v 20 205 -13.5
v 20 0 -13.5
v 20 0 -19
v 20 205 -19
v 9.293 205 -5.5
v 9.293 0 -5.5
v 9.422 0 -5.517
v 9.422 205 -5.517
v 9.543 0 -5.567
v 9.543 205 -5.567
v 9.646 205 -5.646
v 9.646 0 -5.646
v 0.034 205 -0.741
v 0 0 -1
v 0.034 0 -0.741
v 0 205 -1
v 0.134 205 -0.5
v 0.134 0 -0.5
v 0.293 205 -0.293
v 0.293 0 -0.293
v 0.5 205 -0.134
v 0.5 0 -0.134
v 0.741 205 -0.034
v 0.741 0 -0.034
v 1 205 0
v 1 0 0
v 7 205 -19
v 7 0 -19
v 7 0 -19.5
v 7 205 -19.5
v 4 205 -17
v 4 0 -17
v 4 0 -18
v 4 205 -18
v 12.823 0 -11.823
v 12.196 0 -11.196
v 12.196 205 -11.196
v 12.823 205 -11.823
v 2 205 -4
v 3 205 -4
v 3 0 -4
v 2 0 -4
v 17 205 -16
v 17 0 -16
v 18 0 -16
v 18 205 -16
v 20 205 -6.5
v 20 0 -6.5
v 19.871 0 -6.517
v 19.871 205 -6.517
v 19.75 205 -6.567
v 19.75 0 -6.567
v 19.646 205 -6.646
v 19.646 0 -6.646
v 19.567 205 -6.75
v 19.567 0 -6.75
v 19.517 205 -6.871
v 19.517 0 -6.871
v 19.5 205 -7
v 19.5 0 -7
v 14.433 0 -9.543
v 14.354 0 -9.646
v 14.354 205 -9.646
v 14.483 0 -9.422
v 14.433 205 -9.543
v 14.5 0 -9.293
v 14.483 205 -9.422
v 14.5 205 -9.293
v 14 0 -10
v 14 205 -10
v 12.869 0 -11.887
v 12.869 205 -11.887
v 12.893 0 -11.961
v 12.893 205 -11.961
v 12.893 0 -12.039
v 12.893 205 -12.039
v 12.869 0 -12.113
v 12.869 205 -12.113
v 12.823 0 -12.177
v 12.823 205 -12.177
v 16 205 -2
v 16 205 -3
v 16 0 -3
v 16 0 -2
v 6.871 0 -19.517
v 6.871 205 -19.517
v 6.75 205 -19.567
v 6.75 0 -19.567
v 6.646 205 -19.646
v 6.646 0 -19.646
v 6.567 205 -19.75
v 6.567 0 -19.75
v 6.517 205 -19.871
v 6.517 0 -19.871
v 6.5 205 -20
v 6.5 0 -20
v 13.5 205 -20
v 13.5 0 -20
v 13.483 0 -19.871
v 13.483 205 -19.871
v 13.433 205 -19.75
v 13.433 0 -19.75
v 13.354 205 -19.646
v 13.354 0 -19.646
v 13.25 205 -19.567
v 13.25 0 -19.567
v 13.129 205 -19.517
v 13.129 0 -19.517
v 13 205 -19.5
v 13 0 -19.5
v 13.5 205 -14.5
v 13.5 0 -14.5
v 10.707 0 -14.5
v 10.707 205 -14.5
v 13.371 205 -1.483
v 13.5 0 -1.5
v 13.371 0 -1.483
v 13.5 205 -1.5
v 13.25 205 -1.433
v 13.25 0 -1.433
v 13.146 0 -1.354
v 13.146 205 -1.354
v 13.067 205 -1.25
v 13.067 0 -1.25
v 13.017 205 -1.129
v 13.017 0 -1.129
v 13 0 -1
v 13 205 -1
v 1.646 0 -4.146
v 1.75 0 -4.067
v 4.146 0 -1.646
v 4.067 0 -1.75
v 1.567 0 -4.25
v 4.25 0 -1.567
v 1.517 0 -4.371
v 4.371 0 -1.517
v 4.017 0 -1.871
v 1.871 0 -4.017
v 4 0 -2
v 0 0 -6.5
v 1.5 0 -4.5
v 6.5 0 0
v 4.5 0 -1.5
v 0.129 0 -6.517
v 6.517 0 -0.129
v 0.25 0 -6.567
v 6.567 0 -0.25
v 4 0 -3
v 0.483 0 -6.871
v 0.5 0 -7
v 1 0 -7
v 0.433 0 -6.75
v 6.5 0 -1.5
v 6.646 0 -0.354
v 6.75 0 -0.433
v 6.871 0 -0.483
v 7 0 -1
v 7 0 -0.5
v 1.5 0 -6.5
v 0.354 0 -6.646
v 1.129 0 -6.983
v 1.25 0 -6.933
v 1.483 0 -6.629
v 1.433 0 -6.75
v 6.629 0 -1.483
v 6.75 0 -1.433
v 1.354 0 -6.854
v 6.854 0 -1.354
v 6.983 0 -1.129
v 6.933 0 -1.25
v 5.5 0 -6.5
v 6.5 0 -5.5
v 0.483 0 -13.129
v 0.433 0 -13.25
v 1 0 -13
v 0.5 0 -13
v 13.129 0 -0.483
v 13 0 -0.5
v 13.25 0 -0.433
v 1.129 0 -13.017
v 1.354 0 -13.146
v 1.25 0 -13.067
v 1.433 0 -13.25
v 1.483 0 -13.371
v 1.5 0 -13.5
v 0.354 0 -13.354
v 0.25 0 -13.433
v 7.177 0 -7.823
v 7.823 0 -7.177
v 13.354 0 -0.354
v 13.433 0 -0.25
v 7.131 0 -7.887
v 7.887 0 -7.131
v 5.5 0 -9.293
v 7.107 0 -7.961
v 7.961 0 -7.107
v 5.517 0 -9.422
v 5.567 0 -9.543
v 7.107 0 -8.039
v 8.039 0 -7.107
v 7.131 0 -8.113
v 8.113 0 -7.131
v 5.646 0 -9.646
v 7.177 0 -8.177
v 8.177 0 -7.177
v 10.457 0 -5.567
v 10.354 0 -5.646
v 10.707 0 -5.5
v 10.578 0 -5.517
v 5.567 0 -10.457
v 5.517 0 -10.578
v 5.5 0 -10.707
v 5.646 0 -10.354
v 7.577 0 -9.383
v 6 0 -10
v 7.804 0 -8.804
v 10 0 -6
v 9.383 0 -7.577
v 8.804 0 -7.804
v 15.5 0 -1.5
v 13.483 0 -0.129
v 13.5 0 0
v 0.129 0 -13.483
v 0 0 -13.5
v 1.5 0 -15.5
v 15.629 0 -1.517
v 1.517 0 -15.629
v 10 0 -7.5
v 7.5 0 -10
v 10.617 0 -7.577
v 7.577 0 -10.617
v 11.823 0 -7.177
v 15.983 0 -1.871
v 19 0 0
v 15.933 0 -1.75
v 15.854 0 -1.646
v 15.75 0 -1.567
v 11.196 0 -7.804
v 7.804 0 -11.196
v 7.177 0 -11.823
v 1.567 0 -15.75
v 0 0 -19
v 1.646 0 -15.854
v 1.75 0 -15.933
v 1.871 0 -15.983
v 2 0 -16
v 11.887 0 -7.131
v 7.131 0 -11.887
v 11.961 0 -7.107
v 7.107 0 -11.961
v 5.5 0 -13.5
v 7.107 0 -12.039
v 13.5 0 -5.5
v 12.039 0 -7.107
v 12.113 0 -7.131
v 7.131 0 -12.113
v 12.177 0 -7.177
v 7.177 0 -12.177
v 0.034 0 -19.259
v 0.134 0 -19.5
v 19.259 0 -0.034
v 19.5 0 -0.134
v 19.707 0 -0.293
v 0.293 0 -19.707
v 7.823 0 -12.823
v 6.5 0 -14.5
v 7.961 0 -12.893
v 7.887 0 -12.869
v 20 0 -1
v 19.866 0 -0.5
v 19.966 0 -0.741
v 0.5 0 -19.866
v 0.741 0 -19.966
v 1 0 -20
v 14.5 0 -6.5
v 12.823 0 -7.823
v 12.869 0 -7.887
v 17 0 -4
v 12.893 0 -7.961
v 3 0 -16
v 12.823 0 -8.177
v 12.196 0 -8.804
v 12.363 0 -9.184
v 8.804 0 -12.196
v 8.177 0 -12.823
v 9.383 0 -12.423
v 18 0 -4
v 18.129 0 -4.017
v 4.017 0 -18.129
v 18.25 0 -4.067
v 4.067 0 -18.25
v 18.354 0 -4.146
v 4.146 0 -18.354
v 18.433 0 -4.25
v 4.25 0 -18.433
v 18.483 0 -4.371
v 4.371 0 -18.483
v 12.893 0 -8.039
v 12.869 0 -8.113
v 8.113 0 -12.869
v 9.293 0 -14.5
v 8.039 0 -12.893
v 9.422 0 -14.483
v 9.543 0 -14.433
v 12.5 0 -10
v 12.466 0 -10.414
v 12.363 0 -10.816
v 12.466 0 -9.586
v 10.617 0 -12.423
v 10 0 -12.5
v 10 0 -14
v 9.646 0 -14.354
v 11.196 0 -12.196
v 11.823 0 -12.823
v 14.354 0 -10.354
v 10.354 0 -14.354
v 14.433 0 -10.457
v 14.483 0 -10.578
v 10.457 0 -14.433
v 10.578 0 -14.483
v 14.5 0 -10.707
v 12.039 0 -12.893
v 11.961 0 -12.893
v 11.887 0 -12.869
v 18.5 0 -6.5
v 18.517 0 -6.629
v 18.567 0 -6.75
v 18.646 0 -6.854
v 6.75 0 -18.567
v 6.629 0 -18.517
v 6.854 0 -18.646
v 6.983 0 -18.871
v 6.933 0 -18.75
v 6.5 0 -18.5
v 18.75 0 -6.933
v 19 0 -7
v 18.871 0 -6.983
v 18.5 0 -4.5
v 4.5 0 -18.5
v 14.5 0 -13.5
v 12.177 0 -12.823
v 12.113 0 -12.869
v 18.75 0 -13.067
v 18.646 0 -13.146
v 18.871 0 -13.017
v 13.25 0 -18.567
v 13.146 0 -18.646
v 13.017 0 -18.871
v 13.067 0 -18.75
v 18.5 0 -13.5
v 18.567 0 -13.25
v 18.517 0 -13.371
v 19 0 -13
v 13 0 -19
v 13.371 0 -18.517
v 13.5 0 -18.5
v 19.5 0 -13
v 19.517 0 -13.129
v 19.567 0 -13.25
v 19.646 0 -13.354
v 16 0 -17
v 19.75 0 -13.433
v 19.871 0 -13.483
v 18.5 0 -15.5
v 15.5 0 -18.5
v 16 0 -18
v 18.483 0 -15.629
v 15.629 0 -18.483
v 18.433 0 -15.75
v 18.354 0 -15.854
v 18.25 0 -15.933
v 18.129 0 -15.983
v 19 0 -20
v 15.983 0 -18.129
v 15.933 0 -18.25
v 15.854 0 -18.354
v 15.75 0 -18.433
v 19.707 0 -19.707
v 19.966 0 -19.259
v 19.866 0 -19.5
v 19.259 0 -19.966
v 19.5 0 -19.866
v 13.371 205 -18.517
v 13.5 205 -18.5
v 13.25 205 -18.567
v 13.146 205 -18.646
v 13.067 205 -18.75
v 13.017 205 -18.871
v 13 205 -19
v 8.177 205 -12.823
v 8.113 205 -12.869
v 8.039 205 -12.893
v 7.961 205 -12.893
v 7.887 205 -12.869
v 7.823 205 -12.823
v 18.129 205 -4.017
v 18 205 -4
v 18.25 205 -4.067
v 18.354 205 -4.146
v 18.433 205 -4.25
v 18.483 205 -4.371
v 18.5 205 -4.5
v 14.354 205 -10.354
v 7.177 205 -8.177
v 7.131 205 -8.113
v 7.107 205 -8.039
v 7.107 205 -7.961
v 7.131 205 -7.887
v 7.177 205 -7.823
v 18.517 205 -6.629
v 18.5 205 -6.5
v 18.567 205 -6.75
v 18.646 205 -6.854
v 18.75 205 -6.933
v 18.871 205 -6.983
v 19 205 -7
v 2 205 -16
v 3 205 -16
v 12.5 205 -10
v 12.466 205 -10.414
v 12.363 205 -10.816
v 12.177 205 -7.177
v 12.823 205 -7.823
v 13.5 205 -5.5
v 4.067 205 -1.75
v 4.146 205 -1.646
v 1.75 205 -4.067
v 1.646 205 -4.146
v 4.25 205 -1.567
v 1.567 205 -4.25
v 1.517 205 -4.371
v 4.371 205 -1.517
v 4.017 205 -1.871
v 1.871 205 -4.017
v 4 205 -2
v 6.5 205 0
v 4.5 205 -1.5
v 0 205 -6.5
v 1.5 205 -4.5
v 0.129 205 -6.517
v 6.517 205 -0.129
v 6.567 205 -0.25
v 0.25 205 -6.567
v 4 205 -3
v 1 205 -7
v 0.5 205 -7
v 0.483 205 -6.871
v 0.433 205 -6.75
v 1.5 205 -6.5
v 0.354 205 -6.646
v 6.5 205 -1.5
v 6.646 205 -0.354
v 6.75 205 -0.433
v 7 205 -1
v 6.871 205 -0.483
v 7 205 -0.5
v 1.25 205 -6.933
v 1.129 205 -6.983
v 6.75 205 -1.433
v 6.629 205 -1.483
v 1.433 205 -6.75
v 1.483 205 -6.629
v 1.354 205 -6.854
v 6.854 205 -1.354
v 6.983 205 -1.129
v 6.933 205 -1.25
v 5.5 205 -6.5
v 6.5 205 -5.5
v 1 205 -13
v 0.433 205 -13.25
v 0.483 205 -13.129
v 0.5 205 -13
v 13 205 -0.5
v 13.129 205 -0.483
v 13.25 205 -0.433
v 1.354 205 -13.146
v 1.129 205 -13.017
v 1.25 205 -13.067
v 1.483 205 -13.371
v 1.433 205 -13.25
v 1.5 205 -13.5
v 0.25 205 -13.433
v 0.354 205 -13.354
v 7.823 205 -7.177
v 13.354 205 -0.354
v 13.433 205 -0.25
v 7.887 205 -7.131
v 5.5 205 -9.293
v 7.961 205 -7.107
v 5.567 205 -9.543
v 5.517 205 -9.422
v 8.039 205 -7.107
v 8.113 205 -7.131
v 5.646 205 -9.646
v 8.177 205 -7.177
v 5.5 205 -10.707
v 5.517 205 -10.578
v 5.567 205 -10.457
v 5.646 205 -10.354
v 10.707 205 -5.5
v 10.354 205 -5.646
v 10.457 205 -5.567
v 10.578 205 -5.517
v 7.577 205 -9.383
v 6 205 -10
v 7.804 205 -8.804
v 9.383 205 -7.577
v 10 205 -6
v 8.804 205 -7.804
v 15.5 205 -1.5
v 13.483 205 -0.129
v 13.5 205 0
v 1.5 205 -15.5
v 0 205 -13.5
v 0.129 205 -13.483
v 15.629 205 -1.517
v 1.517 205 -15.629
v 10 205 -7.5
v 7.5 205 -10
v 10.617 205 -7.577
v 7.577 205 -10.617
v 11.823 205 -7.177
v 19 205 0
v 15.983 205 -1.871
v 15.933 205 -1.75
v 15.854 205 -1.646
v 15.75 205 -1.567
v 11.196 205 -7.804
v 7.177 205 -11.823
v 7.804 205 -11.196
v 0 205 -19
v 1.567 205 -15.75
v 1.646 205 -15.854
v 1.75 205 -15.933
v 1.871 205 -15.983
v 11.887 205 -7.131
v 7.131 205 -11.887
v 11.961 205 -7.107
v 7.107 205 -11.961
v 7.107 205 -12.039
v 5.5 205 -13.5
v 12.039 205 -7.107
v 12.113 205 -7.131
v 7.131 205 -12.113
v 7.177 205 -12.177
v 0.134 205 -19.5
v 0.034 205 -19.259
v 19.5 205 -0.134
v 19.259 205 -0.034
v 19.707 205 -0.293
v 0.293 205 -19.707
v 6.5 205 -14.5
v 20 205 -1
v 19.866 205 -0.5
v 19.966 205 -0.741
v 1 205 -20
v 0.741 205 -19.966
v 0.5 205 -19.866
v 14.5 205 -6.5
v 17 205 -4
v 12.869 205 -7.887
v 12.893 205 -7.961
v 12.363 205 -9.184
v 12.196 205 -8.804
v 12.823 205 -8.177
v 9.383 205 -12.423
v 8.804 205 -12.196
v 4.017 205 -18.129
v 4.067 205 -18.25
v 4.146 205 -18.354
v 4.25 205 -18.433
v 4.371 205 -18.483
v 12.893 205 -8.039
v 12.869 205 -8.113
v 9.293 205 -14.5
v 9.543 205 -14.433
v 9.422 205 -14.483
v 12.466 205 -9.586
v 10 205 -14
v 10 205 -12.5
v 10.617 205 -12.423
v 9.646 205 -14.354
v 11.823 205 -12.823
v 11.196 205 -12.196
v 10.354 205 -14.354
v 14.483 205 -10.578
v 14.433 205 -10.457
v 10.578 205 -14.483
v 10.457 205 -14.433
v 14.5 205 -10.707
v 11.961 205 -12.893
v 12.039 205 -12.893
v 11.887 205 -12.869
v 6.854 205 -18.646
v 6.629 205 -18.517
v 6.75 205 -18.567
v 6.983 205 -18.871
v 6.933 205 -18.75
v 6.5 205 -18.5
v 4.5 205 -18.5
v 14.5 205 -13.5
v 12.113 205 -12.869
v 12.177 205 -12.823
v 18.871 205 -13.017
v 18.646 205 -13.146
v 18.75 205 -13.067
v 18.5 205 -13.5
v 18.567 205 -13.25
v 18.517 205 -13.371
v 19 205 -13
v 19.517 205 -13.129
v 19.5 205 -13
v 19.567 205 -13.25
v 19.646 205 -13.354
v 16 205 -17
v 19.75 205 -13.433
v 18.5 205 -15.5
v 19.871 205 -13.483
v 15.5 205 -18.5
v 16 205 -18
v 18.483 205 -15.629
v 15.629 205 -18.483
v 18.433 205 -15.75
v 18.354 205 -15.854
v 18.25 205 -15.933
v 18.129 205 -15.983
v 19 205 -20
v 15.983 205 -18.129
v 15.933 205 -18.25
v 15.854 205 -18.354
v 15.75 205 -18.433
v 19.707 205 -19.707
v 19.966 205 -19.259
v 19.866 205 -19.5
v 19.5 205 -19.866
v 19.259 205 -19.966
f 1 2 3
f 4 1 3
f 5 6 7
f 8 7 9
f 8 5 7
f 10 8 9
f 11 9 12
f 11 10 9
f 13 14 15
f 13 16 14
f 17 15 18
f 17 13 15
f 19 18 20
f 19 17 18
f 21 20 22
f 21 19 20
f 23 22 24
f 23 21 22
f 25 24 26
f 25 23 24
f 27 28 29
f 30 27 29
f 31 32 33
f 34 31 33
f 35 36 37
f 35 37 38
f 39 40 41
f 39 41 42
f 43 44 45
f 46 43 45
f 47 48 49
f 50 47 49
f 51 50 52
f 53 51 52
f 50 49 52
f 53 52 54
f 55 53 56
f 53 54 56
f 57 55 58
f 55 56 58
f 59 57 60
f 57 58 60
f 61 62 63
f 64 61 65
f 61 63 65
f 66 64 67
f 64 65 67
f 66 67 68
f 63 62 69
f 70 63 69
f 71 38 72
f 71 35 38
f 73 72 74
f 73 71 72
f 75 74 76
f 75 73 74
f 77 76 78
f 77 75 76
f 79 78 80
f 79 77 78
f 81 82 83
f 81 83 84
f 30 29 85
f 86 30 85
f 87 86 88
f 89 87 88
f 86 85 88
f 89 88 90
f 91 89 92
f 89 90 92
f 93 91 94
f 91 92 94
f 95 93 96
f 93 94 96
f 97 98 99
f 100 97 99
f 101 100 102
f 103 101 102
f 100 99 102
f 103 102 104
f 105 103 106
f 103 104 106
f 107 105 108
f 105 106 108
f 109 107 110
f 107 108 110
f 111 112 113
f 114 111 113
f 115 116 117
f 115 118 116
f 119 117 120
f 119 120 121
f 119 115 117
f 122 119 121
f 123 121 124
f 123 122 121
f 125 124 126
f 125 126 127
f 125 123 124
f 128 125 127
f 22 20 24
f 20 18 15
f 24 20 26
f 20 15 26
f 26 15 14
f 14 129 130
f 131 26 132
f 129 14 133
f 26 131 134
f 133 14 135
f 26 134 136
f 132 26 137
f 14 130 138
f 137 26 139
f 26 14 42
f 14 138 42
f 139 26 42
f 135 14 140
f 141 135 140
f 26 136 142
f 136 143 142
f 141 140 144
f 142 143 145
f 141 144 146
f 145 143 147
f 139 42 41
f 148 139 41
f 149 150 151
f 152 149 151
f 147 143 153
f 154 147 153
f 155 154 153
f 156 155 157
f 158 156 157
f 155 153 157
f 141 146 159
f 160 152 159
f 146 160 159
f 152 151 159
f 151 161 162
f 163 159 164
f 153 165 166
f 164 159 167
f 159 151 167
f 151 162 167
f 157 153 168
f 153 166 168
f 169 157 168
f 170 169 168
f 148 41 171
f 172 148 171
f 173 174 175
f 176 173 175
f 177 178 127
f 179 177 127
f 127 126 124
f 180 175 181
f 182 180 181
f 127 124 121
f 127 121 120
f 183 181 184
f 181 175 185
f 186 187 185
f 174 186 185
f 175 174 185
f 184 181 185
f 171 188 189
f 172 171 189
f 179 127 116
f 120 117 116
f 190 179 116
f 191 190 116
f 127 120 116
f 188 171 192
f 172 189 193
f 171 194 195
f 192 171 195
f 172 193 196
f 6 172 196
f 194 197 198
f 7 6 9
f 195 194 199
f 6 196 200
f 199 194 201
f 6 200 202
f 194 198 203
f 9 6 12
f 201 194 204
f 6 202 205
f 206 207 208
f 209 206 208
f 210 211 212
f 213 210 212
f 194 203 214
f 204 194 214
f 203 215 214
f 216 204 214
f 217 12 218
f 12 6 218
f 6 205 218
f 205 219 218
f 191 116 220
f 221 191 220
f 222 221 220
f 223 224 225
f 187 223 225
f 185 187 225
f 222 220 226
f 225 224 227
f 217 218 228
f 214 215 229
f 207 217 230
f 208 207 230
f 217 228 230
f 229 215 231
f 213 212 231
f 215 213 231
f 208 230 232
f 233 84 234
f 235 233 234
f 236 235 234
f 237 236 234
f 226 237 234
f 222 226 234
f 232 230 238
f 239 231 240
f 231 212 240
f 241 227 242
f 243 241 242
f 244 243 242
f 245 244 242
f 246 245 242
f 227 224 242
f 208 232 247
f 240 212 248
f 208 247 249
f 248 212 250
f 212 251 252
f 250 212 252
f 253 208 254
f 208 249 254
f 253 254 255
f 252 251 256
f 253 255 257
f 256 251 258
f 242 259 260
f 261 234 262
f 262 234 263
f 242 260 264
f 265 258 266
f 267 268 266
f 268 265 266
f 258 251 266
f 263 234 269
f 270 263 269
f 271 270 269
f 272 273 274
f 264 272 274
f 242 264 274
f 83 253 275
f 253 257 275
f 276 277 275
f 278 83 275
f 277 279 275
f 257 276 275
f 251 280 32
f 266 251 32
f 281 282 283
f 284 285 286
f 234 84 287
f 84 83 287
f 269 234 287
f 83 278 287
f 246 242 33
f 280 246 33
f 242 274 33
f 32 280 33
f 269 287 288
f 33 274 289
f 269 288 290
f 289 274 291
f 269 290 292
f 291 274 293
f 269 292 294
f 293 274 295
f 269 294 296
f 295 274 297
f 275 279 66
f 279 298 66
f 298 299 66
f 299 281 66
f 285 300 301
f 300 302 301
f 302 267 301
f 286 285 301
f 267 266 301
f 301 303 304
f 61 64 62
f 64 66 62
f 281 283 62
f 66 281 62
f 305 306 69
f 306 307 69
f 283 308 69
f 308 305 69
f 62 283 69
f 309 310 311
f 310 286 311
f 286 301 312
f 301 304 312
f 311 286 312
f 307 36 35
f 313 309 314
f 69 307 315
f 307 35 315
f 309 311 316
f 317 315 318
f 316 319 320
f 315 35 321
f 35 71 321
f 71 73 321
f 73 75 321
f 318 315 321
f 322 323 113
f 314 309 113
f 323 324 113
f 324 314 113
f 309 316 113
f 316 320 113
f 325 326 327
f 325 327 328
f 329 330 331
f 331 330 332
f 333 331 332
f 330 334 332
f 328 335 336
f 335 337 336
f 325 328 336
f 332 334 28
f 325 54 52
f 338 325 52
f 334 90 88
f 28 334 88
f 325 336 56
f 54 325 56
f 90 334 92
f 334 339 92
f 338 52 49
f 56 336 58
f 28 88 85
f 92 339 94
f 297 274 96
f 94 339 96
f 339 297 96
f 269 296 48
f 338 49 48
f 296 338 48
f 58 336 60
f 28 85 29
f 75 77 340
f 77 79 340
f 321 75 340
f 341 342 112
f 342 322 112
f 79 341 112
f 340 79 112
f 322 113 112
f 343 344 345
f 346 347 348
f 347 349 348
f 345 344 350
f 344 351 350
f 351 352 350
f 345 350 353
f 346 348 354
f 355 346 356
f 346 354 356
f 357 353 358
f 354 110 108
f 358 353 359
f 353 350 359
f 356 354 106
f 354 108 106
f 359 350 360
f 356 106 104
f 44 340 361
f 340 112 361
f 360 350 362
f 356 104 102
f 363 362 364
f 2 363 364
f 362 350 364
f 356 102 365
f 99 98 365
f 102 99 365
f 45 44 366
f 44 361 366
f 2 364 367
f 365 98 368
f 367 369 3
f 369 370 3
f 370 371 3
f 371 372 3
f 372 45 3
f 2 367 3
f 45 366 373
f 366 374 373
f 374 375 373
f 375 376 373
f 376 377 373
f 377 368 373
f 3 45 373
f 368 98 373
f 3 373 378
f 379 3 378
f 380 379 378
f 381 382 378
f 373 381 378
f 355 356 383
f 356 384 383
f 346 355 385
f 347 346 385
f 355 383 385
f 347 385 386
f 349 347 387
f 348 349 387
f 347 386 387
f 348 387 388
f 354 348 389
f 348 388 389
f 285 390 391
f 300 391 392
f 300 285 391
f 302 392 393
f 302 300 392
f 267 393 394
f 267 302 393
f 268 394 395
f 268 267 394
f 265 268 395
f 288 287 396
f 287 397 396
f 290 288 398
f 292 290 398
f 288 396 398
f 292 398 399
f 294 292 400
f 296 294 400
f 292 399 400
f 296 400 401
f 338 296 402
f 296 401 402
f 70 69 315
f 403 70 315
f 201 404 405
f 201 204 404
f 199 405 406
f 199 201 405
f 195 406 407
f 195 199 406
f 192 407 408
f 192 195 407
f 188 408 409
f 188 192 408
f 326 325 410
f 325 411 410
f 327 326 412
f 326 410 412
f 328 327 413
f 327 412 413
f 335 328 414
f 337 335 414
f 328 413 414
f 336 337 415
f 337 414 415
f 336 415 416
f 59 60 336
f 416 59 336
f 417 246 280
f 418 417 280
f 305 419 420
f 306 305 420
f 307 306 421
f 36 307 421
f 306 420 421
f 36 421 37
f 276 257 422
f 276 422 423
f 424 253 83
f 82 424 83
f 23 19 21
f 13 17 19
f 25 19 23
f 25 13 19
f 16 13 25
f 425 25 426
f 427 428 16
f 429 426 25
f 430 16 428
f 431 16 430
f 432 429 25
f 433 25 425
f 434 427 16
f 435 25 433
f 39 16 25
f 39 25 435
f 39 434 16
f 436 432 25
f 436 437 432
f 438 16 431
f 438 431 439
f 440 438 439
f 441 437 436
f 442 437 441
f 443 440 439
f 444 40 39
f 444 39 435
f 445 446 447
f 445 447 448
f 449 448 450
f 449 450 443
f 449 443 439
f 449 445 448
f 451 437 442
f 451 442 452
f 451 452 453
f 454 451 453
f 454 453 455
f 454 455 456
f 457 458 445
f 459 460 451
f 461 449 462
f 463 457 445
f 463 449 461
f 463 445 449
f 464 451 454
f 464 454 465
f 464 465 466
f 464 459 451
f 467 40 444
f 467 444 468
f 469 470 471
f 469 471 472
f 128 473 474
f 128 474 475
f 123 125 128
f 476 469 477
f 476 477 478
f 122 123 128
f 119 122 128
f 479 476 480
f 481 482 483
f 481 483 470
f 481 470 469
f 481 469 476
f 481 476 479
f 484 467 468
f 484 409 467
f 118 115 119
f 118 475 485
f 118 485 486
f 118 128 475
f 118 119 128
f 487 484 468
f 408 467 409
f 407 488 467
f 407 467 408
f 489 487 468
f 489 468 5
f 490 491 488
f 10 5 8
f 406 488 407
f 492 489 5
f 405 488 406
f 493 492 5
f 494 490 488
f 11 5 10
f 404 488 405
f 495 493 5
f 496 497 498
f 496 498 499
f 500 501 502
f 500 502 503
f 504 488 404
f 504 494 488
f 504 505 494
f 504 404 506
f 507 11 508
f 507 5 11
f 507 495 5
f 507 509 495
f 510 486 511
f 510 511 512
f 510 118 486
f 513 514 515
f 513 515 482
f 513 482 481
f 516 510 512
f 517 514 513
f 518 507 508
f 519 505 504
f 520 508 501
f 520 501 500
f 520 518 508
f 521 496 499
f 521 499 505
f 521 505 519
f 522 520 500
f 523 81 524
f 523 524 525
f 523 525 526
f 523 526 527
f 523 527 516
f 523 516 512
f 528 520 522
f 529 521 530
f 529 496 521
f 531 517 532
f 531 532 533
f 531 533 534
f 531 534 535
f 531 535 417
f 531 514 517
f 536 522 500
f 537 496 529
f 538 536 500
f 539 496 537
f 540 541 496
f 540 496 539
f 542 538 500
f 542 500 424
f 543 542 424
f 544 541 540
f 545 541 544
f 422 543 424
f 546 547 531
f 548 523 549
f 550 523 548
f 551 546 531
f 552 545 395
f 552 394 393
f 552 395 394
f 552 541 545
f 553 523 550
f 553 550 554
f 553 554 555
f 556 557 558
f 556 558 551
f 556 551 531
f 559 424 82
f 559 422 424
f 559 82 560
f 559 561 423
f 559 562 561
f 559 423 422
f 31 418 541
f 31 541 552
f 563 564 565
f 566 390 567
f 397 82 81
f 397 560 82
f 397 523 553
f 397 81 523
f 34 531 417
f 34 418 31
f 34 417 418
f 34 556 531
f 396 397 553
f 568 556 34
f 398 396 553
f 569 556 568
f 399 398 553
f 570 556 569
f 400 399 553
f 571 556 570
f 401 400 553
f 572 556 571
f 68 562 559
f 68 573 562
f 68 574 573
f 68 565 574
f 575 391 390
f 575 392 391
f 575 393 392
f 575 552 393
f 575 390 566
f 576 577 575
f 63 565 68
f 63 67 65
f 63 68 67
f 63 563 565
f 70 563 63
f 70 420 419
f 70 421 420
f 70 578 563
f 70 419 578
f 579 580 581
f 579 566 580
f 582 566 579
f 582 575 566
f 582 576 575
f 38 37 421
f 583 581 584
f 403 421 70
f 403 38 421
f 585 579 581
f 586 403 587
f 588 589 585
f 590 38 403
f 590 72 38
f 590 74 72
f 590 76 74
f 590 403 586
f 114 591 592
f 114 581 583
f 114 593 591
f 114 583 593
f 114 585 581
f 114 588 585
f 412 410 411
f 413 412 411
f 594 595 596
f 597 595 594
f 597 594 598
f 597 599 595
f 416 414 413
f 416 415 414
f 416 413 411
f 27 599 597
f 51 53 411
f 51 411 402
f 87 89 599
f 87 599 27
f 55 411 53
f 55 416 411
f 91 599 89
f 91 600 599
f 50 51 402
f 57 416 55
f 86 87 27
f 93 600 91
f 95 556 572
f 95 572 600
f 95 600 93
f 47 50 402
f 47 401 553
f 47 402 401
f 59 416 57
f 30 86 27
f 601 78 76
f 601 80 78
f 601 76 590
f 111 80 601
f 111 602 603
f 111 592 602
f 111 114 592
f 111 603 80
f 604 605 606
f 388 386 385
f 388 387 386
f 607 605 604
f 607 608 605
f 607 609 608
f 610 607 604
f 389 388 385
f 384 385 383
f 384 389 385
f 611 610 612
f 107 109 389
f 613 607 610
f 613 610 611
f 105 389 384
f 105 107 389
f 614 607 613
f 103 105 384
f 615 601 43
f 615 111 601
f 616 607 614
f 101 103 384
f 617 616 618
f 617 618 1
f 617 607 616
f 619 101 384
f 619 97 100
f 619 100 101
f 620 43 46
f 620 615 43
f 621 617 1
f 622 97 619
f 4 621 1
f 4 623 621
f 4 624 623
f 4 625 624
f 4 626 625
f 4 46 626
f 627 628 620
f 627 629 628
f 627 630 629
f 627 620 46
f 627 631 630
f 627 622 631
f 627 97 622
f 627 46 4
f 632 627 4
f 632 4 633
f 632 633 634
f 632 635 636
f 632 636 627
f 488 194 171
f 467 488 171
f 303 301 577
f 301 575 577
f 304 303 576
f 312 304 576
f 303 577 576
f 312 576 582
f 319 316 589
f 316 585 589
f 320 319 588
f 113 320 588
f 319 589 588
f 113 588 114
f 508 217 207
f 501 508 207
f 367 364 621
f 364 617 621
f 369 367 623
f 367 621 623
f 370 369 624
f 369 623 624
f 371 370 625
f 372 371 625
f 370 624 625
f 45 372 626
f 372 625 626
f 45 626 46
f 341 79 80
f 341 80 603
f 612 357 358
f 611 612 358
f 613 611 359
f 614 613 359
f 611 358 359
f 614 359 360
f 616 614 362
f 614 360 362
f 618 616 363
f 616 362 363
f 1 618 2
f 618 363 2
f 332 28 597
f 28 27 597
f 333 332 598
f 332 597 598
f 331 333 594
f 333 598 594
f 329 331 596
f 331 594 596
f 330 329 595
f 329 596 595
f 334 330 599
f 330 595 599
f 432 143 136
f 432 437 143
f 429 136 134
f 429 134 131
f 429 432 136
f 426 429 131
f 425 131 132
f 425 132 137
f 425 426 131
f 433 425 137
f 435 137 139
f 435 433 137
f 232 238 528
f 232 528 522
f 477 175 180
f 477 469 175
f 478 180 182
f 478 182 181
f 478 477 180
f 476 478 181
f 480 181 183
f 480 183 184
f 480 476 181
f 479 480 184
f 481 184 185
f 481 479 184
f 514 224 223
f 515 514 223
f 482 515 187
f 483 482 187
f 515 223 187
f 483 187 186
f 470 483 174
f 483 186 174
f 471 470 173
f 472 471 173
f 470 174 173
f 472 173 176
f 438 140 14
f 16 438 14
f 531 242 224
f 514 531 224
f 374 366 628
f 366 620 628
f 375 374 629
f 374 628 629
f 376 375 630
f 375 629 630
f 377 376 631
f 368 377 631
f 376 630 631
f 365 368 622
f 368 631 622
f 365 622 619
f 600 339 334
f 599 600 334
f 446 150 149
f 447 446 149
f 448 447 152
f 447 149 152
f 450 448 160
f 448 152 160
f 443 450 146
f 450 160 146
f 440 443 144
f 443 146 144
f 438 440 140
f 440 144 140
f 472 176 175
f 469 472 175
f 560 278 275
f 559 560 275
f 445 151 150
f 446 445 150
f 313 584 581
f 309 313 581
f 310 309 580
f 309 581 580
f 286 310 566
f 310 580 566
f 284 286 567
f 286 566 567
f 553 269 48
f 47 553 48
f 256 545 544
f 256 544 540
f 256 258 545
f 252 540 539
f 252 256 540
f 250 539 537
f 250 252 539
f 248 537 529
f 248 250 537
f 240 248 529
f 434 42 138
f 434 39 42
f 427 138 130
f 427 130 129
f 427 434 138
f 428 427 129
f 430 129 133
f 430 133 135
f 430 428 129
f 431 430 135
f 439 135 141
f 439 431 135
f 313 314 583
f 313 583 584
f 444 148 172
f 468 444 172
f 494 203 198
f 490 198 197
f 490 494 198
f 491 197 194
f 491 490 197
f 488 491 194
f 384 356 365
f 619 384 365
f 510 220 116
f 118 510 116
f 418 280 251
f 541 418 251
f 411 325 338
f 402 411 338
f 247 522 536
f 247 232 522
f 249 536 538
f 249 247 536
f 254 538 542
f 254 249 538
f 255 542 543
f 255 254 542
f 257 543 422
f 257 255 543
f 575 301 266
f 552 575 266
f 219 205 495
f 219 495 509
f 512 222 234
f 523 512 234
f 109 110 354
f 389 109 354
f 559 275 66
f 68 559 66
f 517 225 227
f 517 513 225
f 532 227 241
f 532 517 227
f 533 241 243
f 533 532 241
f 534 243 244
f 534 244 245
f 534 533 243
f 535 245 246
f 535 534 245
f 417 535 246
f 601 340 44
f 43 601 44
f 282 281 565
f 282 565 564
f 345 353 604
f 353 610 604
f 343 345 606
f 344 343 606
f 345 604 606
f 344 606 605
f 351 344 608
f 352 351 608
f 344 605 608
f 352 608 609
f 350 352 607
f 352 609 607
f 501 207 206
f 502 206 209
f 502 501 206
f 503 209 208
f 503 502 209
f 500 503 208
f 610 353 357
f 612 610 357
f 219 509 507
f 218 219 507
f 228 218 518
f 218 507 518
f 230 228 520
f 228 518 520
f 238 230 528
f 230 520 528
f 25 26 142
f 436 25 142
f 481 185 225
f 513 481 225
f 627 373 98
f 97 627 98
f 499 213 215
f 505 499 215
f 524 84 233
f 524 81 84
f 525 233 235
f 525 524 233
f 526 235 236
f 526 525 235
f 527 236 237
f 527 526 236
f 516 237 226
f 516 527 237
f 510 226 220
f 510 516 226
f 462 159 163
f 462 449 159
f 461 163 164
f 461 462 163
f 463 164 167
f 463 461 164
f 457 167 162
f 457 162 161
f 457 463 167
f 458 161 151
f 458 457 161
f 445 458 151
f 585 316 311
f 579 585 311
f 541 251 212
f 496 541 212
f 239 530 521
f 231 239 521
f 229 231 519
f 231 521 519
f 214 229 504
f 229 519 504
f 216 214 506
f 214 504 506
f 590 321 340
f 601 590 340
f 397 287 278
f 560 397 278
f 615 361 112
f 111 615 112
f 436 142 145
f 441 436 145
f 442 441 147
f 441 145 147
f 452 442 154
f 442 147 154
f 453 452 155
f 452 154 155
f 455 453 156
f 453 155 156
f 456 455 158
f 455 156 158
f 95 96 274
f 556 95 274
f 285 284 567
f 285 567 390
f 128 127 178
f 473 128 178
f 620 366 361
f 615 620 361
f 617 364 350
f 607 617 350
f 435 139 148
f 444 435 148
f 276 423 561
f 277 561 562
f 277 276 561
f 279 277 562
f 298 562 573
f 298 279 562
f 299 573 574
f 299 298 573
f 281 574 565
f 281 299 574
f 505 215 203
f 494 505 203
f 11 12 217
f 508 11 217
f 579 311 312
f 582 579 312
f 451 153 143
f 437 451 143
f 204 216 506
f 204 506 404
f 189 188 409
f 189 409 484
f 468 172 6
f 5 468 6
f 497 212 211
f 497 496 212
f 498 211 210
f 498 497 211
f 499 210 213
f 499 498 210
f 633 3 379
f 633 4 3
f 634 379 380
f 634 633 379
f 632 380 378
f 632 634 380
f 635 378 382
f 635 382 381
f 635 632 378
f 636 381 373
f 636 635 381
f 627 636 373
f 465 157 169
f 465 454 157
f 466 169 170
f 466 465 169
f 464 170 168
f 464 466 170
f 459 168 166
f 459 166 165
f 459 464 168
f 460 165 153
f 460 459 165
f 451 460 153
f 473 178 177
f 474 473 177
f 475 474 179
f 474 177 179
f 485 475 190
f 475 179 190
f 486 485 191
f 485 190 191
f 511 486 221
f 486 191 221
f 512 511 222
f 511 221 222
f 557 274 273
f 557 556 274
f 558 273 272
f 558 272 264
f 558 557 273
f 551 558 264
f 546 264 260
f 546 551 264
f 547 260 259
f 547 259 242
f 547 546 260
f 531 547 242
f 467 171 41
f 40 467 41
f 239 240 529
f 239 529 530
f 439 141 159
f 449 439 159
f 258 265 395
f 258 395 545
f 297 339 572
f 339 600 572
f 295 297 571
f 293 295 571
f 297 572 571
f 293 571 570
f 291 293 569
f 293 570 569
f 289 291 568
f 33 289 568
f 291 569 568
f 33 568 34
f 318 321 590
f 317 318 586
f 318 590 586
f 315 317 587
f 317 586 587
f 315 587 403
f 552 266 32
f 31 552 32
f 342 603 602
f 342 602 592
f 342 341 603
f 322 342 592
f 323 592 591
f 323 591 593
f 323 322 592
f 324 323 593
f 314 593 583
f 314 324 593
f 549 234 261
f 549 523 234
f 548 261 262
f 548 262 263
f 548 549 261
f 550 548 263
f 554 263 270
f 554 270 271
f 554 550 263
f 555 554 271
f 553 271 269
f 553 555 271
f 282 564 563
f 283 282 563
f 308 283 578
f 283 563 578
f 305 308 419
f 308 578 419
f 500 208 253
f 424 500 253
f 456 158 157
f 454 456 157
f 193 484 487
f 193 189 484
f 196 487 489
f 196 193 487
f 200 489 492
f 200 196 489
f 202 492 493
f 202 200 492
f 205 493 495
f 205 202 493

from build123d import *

# Parameters (mm, degrees)
BOSS_EXTRUDE1_DEPTH = 205
FILLET1_R           = 1
CUT_EXTRUDE1_DEPTH  = 206
FILLET2_R           = 0.5
FILLET3_R           = 0.25


with BuildPart() as part:
    # Sketch3 → Boss-Extrude1 (new body)
    with BuildSketch(Plane(origin=(0, 0, 0), x_dir=(1, 0, 0), z_dir=(0, 1, 0))):
        with BuildLine():
            Line((7, 18.5), (7, 19.5))
            ThreePointArc((7, 19.5), (6.646446609, 19.646446609), (6.5, 20))
            Line((6.5, 20), (0, 20))
            Line((0, 20), (0, 13.5))
            ThreePointArc((0, 13.5), (0.353553391, 13.353553391), (0.5, 13))
            Line((0.5, 13), (1.5, 13))
            Line((1.5, 13), (1.5, 16))
            Line((1.5, 16), (3, 16))
            Line((3, 16), (5.5, 13.5))
            Line((5.5, 13.5), (5.5, 10.5))
            Line((5.5, 10.5), (6, 10))
            Line((6, 10), (5.5, 9.5))
            Line((5.5, 9.5), (5.5, 6.5))
            Line((5.5, 6.5), (3, 4))
            Line((3, 4), (1.5, 4))
            Line((1.5, 4), (1.5, 7))
            Line((1.5, 7), (0.5, 7))
            ThreePointArc((0.5, 7), (0.353553391, 6.646446609), (0, 6.5))
            Line((0, 6.5), (0, 0))
            Line((0, 0), (6.5, 0))
            ThreePointArc((6.5, 0), (6.646446609, 0.353553391), (7, 0.5))
            Line((7, 0.5), (7, 1.5))
            Line((7, 1.5), (4, 1.5))
            Line((4, 1.5), (4, 3))
            Line((4, 3), (6.5, 5.5))
            Line((6.5, 5.5), (9.5, 5.5))
            Line((9.5, 5.5), (10, 6))
            Line((10, 6), (10.5, 5.5))
            Line((10.5, 5.5), (13.5, 5.5))
            Line((13.5, 5.5), (16, 3))
            Line((16, 3), (16, 1.5))
            Line((16, 1.5), (13, 1.5))
            Line((13, 1.5), (13, 0.5))
            ThreePointArc((13, 0.5), (13.353553391, 0.353553391), (13.5, 0))
            Line((13.5, 0), (20, 0))
            Line((20, 0), (20, 6.5))
            ThreePointArc((20, 6.5), (19.646446609, 6.646446609), (19.5, 7))
            Line((19.5, 7), (18.5, 7))
            Line((18.5, 7), (18.5, 4))
            Line((18.5, 4), (17, 4))
            Line((17, 4), (14.5, 6.5))
            Line((14.5, 6.5), (14.5, 9.5))
            Line((14.5, 9.5), (14, 10))
            Line((14, 10), (14.5, 10.5))
            Line((14.5, 10.5), (14.5, 13.5))
            Line((14.5, 13.5), (17, 16))
            Line((17, 16), (18.5, 16))
            Line((18.5, 16), (18.5, 13))
            Line((18.5, 13), (19.5, 13))
            ThreePointArc((19.5, 13), (19.646446609, 13.353553391), (20, 13.5))
            Line((20, 13.5), (20, 20))
            Line((20, 20), (13.5, 20))
            ThreePointArc((13.5, 20), (13.353553391, 19.646446609), (13, 19.5))
            Line((13, 19.5), (13, 18.5))
            Line((13, 18.5), (16, 18.5))
            Line((16, 18.5), (16, 17))
            Line((16, 17), (13.5, 14.5))
            Line((13.5, 14.5), (10.5, 14.5))
            Line((10.5, 14.5), (10, 14))
            Line((10, 14), (9.5, 14.5))
            Line((9.5, 14.5), (6.5, 14.5))
            Line((6.5, 14.5), (4, 17))
            Line((4, 17), (4, 18.5))
            Line((4, 18.5), (7, 18.5))
        make_face()
    extrude(amount=BOSS_EXTRUDE1_DEPTH)

    # Fillet1
    fillet1_edges = [part.edges().sort_by_distance(p)[0] for p in [
        (20, 102.5, 0),
        (0, 102.5, 0),
        (0, 102.5, -20),
        (20, 102.5, -20),
    ]]
    fillet(fillet1_edges, radius=FILLET1_R)

    # Sketch4 → Cut-Extrude1 (cut, through all)
    with BuildSketch(Plane(origin=(0, 205, 0), x_dir=(1, 0, 0), z_dir=(0, 1, 0))):
        with BuildLine():
            Line((10, 11), (11.195582496, 12.195582496))
            ThreePointArc((11.195582496, 12.195582496), (10, 12.5), (8.804417504, 12.195582496))
            Line((8.804417504, 12.195582496), (10, 11))
        make_face()
        with BuildLine():
            ThreePointArc((12.195582496, 11.195582496), (11.767766953, 11.767766953), (11.195582496, 12.195582496))
            Line((11.195582496, 12.195582496), (10, 11))
            Line((10, 11), (11, 10))
            Line((11, 10), (12.195582496, 11.195582496))
        make_face()
        with BuildLine():
            Line((9, 10), (10, 11))
            Line((10, 11), (8.804417504, 12.195582496))
            ThreePointArc((8.804417504, 12.195582496), (8.232233047, 11.767766953), (7.804417504, 11.195582496))
            Line((7.804417504, 11.195582496), (9, 10))
        make_face()
        Polygon((11, 10), (10, 11), (9, 10), (10, 9), align=None)
        with BuildLine():
            Line((7.804417504, 8.804417504), (9, 10))
            Line((9, 10), (7.804417504, 11.195582496))
            ThreePointArc((7.804417504, 11.195582496), (7.5, 10), (7.804417504, 8.804417504))
        make_face()
        with BuildLine():
            Line((10, 9), (9, 10))
            Line((9, 10), (7.804417504, 8.804417504))
            ThreePointArc((7.804417504, 8.804417504), (8.232233047, 8.232233047), (8.804417504, 7.804417504))
            Line((8.804417504, 7.804417504), (10, 9))
        make_face()
        with BuildLine():
            Line((11.195582496, 7.804417504), (10, 9))
            Line((10, 9), (8.804417504, 7.804417504))
            ThreePointArc((8.804417504, 7.804417504), (10, 7.5), (11.195582496, 7.804417504))
        make_face()
        with BuildLine():
            Line((12.195582496, 8.804417504), (11, 10))
            Line((11, 10), (10, 9))
            Line((10, 9), (11.195582496, 7.804417504))
            ThreePointArc((11.195582496, 7.804417504), (11.767766953, 8.232233047), (12.195582496, 8.804417504))
        make_face()
        with BuildLine():
            ThreePointArc((12.5, 10), (12.422700584, 10.616864556), (12.195582496, 11.195582496))
            Line((12.195582496, 11.195582496), (11, 10))
            Line((11, 10), (12.195582496, 8.804417504))
            ThreePointArc((12.195582496, 8.804417504), (12.422700584, 9.383135444), (12.5, 10))
        make_face()
        with BuildLine():
            ThreePointArc((8.804417504, 7.804417504), (8.232233047, 8.232233047), (7.804417504, 8.804417504))
            Line((7.804417504, 8.804417504), (7, 8))
            Line((7, 8), (8, 7))
            Line((8, 7), (8.804417504, 7.804417504))
        make_face()
        with BuildLine():
            Line((13, 8), (12.195582496, 8.804417504))
            ThreePointArc((12.195582496, 8.804417504), (11.767766953, 8.232233047), (11.195582496, 7.804417504))
            Line((11.195582496, 7.804417504), (12, 7))
            Line((12, 7), (13, 8))
        make_face()
        with BuildLine():
            Line((13, 12), (12, 13))
            Line((12, 13), (11.195582496, 12.195582496))
            ThreePointArc((11.195582496, 12.195582496), (11.767766953, 11.767766953), (12.195582496, 11.195582496))
            Line((12.195582496, 11.195582496), (13, 12))
        make_face()
        with BuildLine():
            ThreePointArc((7.804417504, 11.195582496), (8.232233047, 11.767766953), (8.804417504, 12.195582496))
            Line((8.804417504, 12.195582496), (8, 13))
            Line((8, 13), (7, 12))
            Line((7, 12), (7.804417504, 11.195582496))
        make_face()
    extrude(amount=-CUT_EXTRUDE1_DEPTH, mode=Mode.SUBTRACT)

    # Fillet2
    fillet2_edges = [part.edges().sort_by_distance(p)[0] for p in [
        (18.5, 102.5, -13),
        (18.5, 102.5, -16),
        (14.5, 102.5, -10.5),
        (14.5, 102.5, -9.5),
        (18.5, 102.5, -4),
        (18.5, 102.5, -7),
        (13, 102.5, -1.5),
        (16, 102.5, -1.5),
        (10.5, 102.5, -5.5),
        (9.5, 102.5, -5.5),
        (4, 102.5, -1.5),
        (7, 102.5, -1.5),
        (1.5, 102.5, -7),
        (1.5, 102.5, -4),
        (5.5, 102.5, -9.5),
        (5.5, 102.5, -10.5),
        (1.5, 102.5, -16),
        (1.5, 102.5, -13),
        (7, 102.5, -18.5),
        (4, 102.5, -18.5),
        (9.5, 102.5, -14.5),
        (10.5, 102.5, -14.5),
        (16, 102.5, -18.5),
        (13, 102.5, -18.5),
    ]]
    fillet(fillet2_edges, radius=FILLET2_R)

    # Fillet3
    fillet3_edges = [part.edges().sort_by_distance(p)[0] for p in [
        (7, 102.5, -12),
        (8, 102.5, -13),
        (12, 102.5, -13),
        (13, 102.5, -12),
        (13, 102.5, -8),
        (12, 102.5, -7),
        (8, 102.5, -7),
        (7, 102.5, -8),
    ]]
    fillet(fillet3_edges, radius=FILLET3_R)


solid = part.part
